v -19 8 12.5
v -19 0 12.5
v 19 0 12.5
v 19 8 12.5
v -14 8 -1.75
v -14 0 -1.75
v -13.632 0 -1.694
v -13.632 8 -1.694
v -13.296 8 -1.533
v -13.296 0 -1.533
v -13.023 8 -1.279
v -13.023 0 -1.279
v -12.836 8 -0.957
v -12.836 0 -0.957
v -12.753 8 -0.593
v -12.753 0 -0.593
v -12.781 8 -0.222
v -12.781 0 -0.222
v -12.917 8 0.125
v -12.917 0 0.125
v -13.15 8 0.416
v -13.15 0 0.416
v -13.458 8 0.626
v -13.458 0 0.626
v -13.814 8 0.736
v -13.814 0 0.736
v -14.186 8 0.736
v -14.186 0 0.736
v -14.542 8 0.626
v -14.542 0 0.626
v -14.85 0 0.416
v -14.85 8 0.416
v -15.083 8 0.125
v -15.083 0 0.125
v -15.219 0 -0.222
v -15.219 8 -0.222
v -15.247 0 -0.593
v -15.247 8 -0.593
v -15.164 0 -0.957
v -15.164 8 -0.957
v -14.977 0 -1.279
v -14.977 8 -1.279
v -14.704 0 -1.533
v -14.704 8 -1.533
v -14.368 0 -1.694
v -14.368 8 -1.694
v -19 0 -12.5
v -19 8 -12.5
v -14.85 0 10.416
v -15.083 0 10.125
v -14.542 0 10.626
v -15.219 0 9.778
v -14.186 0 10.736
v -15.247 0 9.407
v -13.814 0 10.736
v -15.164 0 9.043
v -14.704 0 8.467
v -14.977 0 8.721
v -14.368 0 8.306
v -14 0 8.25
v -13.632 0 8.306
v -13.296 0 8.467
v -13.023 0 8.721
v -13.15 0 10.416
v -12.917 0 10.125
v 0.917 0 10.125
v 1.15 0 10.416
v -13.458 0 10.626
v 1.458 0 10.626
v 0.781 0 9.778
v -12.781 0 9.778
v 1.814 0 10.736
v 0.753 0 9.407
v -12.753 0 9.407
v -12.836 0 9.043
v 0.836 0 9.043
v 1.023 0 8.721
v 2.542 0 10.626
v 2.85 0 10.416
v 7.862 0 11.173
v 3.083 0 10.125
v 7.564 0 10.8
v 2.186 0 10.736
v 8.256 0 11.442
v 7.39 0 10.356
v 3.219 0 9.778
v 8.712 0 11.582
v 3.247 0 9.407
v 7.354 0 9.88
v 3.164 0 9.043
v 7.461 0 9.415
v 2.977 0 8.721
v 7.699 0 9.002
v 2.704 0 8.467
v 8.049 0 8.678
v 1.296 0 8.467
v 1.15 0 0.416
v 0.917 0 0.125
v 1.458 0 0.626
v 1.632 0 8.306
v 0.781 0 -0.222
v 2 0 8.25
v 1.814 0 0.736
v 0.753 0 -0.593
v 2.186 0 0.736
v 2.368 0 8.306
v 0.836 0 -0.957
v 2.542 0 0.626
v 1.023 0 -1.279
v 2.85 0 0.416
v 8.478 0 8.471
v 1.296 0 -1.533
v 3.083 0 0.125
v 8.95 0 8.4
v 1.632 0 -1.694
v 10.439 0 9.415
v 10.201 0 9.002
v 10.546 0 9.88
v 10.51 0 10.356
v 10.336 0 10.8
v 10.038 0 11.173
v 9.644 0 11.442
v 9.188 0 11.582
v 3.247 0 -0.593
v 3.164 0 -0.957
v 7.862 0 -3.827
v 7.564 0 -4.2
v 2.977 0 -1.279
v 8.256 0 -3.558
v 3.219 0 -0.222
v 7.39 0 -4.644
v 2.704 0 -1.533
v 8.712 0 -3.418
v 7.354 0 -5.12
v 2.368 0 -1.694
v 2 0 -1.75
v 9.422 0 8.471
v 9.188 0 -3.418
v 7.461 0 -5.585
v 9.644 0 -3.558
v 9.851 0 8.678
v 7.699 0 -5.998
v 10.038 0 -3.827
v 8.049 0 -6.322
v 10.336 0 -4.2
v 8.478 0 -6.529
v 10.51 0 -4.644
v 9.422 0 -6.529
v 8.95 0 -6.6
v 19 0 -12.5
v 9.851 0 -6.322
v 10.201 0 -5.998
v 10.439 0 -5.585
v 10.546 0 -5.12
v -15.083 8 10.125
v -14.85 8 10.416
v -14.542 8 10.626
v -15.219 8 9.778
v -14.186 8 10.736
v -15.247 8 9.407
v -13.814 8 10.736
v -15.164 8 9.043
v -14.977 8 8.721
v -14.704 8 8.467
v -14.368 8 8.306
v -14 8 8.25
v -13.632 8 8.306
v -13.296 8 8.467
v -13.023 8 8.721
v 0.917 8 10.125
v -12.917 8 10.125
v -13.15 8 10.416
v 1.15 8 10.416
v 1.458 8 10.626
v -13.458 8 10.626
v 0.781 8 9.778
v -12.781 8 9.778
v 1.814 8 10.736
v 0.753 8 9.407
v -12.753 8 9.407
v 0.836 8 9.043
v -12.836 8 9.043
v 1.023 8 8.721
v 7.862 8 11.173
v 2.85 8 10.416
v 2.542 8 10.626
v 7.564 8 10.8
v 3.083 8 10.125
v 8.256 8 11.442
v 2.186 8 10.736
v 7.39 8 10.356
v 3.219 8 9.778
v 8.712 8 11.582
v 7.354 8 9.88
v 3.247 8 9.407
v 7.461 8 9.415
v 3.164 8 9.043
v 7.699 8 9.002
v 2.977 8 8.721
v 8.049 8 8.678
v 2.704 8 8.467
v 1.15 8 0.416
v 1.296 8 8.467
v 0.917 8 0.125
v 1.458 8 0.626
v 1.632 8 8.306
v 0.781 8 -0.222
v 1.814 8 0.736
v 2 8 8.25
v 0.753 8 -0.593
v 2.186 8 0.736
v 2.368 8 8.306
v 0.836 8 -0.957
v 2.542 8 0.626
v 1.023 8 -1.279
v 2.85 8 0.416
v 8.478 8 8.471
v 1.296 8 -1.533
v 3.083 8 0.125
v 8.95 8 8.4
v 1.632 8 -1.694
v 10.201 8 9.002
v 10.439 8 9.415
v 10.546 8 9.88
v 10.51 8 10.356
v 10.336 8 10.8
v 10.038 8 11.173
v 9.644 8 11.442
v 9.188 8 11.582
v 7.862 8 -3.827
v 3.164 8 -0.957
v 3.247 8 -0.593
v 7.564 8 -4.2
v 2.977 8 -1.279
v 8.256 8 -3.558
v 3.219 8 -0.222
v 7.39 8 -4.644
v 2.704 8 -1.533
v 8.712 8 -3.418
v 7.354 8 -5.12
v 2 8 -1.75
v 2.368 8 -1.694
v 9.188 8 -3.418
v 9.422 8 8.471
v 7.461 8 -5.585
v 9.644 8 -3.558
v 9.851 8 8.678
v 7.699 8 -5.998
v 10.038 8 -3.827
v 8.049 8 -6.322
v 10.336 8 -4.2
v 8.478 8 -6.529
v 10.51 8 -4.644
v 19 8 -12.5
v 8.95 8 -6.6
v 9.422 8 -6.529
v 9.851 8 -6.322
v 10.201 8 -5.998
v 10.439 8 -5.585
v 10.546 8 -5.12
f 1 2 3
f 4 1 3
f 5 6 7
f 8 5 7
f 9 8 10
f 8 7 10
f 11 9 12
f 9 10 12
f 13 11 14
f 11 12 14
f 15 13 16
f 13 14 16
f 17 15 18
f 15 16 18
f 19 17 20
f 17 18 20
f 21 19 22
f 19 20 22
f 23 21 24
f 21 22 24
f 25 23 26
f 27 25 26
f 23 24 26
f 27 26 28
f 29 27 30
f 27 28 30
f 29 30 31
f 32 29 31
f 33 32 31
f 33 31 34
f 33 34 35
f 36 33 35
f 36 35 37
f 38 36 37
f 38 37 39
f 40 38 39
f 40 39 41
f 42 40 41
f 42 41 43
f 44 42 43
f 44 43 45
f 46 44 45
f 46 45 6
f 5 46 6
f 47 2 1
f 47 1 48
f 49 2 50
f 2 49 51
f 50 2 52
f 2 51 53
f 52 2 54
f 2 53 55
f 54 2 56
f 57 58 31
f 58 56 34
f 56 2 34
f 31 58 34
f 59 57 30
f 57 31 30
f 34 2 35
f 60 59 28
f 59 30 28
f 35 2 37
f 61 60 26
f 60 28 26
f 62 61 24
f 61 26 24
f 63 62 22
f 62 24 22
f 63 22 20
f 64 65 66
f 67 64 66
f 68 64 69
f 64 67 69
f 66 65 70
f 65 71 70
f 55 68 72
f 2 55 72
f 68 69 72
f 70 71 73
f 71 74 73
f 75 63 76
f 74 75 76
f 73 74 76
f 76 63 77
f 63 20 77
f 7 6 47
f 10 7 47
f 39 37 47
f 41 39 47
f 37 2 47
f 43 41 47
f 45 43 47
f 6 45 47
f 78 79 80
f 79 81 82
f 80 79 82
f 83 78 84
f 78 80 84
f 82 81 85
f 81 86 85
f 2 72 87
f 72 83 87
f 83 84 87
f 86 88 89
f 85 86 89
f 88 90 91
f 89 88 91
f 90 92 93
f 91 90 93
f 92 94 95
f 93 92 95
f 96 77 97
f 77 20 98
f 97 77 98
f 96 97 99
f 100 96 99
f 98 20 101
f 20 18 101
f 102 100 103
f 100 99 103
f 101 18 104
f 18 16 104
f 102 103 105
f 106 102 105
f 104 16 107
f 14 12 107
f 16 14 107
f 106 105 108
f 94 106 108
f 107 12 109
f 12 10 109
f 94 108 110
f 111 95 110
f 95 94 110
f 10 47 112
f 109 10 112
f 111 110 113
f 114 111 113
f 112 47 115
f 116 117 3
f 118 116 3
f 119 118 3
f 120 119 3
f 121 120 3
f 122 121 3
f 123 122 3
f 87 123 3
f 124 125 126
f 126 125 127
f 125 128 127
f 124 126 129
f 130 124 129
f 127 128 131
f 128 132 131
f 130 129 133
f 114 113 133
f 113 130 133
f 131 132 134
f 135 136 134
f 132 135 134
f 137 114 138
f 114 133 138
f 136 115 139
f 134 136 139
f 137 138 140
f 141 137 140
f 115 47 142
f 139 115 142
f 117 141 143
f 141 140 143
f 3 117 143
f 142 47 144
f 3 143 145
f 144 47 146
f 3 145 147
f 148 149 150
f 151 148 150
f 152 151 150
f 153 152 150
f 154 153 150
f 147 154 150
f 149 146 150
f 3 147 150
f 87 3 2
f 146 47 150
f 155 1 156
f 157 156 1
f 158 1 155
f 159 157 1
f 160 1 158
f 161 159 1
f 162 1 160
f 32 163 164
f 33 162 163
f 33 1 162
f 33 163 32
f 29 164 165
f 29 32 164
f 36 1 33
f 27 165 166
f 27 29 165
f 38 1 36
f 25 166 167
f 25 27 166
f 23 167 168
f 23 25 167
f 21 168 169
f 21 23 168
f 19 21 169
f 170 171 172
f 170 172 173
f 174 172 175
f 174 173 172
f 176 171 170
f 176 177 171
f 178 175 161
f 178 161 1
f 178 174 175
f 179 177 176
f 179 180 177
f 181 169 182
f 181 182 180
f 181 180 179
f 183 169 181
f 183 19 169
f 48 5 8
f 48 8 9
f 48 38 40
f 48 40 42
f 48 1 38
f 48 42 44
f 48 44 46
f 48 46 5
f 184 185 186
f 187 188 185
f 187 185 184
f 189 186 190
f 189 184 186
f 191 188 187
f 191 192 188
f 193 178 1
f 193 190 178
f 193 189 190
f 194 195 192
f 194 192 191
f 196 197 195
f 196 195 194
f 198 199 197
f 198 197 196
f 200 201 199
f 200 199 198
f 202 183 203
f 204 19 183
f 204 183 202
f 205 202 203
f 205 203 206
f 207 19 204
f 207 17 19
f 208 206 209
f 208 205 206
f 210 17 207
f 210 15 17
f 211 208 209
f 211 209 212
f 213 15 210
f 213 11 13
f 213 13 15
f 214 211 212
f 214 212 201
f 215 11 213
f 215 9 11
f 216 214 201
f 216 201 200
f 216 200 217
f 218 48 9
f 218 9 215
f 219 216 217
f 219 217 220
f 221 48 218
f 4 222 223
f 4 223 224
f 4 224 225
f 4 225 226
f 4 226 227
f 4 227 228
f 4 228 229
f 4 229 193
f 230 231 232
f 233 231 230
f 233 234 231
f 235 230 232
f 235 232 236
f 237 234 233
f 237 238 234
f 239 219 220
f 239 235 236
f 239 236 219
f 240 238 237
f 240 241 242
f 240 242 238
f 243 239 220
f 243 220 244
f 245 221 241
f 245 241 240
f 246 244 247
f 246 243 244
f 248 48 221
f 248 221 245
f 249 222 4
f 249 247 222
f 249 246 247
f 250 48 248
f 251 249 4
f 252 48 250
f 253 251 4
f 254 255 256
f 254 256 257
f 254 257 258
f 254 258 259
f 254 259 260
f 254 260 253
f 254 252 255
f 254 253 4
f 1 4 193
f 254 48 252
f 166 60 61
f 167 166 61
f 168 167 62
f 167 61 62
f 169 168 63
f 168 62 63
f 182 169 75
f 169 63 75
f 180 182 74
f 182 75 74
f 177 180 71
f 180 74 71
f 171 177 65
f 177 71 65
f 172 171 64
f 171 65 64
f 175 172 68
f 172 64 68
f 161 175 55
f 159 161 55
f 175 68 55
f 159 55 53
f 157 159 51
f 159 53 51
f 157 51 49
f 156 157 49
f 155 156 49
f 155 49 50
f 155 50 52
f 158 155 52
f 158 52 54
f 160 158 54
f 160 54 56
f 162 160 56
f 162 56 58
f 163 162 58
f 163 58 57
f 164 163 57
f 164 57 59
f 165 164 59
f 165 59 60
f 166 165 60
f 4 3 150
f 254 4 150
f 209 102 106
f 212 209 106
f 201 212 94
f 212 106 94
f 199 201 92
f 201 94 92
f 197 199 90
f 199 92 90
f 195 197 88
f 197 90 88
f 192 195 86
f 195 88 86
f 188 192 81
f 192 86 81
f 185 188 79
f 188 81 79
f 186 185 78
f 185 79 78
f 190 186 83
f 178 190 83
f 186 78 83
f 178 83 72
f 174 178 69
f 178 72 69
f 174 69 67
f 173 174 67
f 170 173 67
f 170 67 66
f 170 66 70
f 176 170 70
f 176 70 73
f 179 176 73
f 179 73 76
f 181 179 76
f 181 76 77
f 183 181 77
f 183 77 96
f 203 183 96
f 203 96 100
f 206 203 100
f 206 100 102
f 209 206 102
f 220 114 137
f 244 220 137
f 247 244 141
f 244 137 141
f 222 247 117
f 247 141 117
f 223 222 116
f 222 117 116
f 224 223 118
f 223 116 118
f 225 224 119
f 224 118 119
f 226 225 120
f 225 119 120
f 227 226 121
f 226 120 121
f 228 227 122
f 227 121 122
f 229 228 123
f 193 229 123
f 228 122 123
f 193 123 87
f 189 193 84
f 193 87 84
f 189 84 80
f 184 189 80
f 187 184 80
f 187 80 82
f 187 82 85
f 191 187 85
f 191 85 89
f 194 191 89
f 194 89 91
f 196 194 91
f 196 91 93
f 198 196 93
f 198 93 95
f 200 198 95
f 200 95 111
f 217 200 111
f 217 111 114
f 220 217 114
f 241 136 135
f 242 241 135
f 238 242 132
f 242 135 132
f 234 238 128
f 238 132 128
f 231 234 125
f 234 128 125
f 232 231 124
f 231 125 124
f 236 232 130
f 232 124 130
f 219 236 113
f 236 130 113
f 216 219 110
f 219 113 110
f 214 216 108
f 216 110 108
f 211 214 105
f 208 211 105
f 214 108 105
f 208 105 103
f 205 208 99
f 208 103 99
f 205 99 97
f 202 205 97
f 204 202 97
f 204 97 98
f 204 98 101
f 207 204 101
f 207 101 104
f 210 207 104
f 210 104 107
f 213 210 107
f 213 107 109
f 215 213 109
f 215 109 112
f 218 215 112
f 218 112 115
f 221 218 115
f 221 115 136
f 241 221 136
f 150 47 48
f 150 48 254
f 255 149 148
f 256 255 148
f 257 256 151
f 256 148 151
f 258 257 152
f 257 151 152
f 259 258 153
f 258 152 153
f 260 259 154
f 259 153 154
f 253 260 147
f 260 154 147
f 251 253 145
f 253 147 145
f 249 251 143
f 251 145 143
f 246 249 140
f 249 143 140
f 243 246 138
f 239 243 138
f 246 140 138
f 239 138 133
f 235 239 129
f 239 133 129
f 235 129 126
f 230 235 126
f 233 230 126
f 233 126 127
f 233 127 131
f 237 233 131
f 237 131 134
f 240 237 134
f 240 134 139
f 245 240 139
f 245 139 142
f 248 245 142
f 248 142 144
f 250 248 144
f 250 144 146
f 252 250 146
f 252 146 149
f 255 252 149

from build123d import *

# Parameters (mm, degrees)
SKETCH_1_W          = 38
SKETCH_1_H          = 25
EXTRUDE_1_DEPTH     = 8
SKETCH_2_R          = 1.25
CUT_EXTRUDE_1_DEPTH = 25.109126902
SKETCH_4_R          = 1.6
CUT_EXTRUDE_2_DEPTH = 25.109126902


with BuildPart() as part:
    # 草图1 → 凸台-拉伸1 (new body)
    with BuildSketch(Plane(origin=(0, 0, 0), x_dir=(1, 0, 0), z_dir=(0, 1, 0))):
        Rectangle(SKETCH_1_W, SKETCH_1_H)
    extrude(amount=EXTRUDE_1_DEPTH)

    # 草图2 → 切除-拉伸1 (cut, through all)
    with BuildSketch(Plane.XZ):
        with Locations(Location((2, 9.5, 0), (0, 0, 270))):
            Circle(SKETCH_2_R)
        with Locations(Location((2, -0.5, 0), (0, 0, 270))):
            Circle(SKETCH_2_R)
        with Locations(Location((-14, 9.5, 0), (0, 0, 270))):
            Circle(SKETCH_2_R)
        with Locations(Location((-14, -0.5, 0), (0, 0, 270))):
            Circle(SKETCH_2_R)
    extrude(amount=-CUT_EXTRUDE_1_DEPTH, mode=Mode.SUBTRACT)

    # 草图4 → 切除-拉伸2 (cut, through all)
    with BuildSketch(Plane.XZ):
        with Locations(Location((8.95, 10, 0), (0, 0, 270))):
            Circle(SKETCH_4_R)
        with Locations(Location((8.95, -5, 0), (0, 0, 270))):
            Circle(SKETCH_4_R)
    extrude(amount=-CUT_EXTRUDE_2_DEPTH, mode=Mode.SUBTRACT)


solid = part.part
